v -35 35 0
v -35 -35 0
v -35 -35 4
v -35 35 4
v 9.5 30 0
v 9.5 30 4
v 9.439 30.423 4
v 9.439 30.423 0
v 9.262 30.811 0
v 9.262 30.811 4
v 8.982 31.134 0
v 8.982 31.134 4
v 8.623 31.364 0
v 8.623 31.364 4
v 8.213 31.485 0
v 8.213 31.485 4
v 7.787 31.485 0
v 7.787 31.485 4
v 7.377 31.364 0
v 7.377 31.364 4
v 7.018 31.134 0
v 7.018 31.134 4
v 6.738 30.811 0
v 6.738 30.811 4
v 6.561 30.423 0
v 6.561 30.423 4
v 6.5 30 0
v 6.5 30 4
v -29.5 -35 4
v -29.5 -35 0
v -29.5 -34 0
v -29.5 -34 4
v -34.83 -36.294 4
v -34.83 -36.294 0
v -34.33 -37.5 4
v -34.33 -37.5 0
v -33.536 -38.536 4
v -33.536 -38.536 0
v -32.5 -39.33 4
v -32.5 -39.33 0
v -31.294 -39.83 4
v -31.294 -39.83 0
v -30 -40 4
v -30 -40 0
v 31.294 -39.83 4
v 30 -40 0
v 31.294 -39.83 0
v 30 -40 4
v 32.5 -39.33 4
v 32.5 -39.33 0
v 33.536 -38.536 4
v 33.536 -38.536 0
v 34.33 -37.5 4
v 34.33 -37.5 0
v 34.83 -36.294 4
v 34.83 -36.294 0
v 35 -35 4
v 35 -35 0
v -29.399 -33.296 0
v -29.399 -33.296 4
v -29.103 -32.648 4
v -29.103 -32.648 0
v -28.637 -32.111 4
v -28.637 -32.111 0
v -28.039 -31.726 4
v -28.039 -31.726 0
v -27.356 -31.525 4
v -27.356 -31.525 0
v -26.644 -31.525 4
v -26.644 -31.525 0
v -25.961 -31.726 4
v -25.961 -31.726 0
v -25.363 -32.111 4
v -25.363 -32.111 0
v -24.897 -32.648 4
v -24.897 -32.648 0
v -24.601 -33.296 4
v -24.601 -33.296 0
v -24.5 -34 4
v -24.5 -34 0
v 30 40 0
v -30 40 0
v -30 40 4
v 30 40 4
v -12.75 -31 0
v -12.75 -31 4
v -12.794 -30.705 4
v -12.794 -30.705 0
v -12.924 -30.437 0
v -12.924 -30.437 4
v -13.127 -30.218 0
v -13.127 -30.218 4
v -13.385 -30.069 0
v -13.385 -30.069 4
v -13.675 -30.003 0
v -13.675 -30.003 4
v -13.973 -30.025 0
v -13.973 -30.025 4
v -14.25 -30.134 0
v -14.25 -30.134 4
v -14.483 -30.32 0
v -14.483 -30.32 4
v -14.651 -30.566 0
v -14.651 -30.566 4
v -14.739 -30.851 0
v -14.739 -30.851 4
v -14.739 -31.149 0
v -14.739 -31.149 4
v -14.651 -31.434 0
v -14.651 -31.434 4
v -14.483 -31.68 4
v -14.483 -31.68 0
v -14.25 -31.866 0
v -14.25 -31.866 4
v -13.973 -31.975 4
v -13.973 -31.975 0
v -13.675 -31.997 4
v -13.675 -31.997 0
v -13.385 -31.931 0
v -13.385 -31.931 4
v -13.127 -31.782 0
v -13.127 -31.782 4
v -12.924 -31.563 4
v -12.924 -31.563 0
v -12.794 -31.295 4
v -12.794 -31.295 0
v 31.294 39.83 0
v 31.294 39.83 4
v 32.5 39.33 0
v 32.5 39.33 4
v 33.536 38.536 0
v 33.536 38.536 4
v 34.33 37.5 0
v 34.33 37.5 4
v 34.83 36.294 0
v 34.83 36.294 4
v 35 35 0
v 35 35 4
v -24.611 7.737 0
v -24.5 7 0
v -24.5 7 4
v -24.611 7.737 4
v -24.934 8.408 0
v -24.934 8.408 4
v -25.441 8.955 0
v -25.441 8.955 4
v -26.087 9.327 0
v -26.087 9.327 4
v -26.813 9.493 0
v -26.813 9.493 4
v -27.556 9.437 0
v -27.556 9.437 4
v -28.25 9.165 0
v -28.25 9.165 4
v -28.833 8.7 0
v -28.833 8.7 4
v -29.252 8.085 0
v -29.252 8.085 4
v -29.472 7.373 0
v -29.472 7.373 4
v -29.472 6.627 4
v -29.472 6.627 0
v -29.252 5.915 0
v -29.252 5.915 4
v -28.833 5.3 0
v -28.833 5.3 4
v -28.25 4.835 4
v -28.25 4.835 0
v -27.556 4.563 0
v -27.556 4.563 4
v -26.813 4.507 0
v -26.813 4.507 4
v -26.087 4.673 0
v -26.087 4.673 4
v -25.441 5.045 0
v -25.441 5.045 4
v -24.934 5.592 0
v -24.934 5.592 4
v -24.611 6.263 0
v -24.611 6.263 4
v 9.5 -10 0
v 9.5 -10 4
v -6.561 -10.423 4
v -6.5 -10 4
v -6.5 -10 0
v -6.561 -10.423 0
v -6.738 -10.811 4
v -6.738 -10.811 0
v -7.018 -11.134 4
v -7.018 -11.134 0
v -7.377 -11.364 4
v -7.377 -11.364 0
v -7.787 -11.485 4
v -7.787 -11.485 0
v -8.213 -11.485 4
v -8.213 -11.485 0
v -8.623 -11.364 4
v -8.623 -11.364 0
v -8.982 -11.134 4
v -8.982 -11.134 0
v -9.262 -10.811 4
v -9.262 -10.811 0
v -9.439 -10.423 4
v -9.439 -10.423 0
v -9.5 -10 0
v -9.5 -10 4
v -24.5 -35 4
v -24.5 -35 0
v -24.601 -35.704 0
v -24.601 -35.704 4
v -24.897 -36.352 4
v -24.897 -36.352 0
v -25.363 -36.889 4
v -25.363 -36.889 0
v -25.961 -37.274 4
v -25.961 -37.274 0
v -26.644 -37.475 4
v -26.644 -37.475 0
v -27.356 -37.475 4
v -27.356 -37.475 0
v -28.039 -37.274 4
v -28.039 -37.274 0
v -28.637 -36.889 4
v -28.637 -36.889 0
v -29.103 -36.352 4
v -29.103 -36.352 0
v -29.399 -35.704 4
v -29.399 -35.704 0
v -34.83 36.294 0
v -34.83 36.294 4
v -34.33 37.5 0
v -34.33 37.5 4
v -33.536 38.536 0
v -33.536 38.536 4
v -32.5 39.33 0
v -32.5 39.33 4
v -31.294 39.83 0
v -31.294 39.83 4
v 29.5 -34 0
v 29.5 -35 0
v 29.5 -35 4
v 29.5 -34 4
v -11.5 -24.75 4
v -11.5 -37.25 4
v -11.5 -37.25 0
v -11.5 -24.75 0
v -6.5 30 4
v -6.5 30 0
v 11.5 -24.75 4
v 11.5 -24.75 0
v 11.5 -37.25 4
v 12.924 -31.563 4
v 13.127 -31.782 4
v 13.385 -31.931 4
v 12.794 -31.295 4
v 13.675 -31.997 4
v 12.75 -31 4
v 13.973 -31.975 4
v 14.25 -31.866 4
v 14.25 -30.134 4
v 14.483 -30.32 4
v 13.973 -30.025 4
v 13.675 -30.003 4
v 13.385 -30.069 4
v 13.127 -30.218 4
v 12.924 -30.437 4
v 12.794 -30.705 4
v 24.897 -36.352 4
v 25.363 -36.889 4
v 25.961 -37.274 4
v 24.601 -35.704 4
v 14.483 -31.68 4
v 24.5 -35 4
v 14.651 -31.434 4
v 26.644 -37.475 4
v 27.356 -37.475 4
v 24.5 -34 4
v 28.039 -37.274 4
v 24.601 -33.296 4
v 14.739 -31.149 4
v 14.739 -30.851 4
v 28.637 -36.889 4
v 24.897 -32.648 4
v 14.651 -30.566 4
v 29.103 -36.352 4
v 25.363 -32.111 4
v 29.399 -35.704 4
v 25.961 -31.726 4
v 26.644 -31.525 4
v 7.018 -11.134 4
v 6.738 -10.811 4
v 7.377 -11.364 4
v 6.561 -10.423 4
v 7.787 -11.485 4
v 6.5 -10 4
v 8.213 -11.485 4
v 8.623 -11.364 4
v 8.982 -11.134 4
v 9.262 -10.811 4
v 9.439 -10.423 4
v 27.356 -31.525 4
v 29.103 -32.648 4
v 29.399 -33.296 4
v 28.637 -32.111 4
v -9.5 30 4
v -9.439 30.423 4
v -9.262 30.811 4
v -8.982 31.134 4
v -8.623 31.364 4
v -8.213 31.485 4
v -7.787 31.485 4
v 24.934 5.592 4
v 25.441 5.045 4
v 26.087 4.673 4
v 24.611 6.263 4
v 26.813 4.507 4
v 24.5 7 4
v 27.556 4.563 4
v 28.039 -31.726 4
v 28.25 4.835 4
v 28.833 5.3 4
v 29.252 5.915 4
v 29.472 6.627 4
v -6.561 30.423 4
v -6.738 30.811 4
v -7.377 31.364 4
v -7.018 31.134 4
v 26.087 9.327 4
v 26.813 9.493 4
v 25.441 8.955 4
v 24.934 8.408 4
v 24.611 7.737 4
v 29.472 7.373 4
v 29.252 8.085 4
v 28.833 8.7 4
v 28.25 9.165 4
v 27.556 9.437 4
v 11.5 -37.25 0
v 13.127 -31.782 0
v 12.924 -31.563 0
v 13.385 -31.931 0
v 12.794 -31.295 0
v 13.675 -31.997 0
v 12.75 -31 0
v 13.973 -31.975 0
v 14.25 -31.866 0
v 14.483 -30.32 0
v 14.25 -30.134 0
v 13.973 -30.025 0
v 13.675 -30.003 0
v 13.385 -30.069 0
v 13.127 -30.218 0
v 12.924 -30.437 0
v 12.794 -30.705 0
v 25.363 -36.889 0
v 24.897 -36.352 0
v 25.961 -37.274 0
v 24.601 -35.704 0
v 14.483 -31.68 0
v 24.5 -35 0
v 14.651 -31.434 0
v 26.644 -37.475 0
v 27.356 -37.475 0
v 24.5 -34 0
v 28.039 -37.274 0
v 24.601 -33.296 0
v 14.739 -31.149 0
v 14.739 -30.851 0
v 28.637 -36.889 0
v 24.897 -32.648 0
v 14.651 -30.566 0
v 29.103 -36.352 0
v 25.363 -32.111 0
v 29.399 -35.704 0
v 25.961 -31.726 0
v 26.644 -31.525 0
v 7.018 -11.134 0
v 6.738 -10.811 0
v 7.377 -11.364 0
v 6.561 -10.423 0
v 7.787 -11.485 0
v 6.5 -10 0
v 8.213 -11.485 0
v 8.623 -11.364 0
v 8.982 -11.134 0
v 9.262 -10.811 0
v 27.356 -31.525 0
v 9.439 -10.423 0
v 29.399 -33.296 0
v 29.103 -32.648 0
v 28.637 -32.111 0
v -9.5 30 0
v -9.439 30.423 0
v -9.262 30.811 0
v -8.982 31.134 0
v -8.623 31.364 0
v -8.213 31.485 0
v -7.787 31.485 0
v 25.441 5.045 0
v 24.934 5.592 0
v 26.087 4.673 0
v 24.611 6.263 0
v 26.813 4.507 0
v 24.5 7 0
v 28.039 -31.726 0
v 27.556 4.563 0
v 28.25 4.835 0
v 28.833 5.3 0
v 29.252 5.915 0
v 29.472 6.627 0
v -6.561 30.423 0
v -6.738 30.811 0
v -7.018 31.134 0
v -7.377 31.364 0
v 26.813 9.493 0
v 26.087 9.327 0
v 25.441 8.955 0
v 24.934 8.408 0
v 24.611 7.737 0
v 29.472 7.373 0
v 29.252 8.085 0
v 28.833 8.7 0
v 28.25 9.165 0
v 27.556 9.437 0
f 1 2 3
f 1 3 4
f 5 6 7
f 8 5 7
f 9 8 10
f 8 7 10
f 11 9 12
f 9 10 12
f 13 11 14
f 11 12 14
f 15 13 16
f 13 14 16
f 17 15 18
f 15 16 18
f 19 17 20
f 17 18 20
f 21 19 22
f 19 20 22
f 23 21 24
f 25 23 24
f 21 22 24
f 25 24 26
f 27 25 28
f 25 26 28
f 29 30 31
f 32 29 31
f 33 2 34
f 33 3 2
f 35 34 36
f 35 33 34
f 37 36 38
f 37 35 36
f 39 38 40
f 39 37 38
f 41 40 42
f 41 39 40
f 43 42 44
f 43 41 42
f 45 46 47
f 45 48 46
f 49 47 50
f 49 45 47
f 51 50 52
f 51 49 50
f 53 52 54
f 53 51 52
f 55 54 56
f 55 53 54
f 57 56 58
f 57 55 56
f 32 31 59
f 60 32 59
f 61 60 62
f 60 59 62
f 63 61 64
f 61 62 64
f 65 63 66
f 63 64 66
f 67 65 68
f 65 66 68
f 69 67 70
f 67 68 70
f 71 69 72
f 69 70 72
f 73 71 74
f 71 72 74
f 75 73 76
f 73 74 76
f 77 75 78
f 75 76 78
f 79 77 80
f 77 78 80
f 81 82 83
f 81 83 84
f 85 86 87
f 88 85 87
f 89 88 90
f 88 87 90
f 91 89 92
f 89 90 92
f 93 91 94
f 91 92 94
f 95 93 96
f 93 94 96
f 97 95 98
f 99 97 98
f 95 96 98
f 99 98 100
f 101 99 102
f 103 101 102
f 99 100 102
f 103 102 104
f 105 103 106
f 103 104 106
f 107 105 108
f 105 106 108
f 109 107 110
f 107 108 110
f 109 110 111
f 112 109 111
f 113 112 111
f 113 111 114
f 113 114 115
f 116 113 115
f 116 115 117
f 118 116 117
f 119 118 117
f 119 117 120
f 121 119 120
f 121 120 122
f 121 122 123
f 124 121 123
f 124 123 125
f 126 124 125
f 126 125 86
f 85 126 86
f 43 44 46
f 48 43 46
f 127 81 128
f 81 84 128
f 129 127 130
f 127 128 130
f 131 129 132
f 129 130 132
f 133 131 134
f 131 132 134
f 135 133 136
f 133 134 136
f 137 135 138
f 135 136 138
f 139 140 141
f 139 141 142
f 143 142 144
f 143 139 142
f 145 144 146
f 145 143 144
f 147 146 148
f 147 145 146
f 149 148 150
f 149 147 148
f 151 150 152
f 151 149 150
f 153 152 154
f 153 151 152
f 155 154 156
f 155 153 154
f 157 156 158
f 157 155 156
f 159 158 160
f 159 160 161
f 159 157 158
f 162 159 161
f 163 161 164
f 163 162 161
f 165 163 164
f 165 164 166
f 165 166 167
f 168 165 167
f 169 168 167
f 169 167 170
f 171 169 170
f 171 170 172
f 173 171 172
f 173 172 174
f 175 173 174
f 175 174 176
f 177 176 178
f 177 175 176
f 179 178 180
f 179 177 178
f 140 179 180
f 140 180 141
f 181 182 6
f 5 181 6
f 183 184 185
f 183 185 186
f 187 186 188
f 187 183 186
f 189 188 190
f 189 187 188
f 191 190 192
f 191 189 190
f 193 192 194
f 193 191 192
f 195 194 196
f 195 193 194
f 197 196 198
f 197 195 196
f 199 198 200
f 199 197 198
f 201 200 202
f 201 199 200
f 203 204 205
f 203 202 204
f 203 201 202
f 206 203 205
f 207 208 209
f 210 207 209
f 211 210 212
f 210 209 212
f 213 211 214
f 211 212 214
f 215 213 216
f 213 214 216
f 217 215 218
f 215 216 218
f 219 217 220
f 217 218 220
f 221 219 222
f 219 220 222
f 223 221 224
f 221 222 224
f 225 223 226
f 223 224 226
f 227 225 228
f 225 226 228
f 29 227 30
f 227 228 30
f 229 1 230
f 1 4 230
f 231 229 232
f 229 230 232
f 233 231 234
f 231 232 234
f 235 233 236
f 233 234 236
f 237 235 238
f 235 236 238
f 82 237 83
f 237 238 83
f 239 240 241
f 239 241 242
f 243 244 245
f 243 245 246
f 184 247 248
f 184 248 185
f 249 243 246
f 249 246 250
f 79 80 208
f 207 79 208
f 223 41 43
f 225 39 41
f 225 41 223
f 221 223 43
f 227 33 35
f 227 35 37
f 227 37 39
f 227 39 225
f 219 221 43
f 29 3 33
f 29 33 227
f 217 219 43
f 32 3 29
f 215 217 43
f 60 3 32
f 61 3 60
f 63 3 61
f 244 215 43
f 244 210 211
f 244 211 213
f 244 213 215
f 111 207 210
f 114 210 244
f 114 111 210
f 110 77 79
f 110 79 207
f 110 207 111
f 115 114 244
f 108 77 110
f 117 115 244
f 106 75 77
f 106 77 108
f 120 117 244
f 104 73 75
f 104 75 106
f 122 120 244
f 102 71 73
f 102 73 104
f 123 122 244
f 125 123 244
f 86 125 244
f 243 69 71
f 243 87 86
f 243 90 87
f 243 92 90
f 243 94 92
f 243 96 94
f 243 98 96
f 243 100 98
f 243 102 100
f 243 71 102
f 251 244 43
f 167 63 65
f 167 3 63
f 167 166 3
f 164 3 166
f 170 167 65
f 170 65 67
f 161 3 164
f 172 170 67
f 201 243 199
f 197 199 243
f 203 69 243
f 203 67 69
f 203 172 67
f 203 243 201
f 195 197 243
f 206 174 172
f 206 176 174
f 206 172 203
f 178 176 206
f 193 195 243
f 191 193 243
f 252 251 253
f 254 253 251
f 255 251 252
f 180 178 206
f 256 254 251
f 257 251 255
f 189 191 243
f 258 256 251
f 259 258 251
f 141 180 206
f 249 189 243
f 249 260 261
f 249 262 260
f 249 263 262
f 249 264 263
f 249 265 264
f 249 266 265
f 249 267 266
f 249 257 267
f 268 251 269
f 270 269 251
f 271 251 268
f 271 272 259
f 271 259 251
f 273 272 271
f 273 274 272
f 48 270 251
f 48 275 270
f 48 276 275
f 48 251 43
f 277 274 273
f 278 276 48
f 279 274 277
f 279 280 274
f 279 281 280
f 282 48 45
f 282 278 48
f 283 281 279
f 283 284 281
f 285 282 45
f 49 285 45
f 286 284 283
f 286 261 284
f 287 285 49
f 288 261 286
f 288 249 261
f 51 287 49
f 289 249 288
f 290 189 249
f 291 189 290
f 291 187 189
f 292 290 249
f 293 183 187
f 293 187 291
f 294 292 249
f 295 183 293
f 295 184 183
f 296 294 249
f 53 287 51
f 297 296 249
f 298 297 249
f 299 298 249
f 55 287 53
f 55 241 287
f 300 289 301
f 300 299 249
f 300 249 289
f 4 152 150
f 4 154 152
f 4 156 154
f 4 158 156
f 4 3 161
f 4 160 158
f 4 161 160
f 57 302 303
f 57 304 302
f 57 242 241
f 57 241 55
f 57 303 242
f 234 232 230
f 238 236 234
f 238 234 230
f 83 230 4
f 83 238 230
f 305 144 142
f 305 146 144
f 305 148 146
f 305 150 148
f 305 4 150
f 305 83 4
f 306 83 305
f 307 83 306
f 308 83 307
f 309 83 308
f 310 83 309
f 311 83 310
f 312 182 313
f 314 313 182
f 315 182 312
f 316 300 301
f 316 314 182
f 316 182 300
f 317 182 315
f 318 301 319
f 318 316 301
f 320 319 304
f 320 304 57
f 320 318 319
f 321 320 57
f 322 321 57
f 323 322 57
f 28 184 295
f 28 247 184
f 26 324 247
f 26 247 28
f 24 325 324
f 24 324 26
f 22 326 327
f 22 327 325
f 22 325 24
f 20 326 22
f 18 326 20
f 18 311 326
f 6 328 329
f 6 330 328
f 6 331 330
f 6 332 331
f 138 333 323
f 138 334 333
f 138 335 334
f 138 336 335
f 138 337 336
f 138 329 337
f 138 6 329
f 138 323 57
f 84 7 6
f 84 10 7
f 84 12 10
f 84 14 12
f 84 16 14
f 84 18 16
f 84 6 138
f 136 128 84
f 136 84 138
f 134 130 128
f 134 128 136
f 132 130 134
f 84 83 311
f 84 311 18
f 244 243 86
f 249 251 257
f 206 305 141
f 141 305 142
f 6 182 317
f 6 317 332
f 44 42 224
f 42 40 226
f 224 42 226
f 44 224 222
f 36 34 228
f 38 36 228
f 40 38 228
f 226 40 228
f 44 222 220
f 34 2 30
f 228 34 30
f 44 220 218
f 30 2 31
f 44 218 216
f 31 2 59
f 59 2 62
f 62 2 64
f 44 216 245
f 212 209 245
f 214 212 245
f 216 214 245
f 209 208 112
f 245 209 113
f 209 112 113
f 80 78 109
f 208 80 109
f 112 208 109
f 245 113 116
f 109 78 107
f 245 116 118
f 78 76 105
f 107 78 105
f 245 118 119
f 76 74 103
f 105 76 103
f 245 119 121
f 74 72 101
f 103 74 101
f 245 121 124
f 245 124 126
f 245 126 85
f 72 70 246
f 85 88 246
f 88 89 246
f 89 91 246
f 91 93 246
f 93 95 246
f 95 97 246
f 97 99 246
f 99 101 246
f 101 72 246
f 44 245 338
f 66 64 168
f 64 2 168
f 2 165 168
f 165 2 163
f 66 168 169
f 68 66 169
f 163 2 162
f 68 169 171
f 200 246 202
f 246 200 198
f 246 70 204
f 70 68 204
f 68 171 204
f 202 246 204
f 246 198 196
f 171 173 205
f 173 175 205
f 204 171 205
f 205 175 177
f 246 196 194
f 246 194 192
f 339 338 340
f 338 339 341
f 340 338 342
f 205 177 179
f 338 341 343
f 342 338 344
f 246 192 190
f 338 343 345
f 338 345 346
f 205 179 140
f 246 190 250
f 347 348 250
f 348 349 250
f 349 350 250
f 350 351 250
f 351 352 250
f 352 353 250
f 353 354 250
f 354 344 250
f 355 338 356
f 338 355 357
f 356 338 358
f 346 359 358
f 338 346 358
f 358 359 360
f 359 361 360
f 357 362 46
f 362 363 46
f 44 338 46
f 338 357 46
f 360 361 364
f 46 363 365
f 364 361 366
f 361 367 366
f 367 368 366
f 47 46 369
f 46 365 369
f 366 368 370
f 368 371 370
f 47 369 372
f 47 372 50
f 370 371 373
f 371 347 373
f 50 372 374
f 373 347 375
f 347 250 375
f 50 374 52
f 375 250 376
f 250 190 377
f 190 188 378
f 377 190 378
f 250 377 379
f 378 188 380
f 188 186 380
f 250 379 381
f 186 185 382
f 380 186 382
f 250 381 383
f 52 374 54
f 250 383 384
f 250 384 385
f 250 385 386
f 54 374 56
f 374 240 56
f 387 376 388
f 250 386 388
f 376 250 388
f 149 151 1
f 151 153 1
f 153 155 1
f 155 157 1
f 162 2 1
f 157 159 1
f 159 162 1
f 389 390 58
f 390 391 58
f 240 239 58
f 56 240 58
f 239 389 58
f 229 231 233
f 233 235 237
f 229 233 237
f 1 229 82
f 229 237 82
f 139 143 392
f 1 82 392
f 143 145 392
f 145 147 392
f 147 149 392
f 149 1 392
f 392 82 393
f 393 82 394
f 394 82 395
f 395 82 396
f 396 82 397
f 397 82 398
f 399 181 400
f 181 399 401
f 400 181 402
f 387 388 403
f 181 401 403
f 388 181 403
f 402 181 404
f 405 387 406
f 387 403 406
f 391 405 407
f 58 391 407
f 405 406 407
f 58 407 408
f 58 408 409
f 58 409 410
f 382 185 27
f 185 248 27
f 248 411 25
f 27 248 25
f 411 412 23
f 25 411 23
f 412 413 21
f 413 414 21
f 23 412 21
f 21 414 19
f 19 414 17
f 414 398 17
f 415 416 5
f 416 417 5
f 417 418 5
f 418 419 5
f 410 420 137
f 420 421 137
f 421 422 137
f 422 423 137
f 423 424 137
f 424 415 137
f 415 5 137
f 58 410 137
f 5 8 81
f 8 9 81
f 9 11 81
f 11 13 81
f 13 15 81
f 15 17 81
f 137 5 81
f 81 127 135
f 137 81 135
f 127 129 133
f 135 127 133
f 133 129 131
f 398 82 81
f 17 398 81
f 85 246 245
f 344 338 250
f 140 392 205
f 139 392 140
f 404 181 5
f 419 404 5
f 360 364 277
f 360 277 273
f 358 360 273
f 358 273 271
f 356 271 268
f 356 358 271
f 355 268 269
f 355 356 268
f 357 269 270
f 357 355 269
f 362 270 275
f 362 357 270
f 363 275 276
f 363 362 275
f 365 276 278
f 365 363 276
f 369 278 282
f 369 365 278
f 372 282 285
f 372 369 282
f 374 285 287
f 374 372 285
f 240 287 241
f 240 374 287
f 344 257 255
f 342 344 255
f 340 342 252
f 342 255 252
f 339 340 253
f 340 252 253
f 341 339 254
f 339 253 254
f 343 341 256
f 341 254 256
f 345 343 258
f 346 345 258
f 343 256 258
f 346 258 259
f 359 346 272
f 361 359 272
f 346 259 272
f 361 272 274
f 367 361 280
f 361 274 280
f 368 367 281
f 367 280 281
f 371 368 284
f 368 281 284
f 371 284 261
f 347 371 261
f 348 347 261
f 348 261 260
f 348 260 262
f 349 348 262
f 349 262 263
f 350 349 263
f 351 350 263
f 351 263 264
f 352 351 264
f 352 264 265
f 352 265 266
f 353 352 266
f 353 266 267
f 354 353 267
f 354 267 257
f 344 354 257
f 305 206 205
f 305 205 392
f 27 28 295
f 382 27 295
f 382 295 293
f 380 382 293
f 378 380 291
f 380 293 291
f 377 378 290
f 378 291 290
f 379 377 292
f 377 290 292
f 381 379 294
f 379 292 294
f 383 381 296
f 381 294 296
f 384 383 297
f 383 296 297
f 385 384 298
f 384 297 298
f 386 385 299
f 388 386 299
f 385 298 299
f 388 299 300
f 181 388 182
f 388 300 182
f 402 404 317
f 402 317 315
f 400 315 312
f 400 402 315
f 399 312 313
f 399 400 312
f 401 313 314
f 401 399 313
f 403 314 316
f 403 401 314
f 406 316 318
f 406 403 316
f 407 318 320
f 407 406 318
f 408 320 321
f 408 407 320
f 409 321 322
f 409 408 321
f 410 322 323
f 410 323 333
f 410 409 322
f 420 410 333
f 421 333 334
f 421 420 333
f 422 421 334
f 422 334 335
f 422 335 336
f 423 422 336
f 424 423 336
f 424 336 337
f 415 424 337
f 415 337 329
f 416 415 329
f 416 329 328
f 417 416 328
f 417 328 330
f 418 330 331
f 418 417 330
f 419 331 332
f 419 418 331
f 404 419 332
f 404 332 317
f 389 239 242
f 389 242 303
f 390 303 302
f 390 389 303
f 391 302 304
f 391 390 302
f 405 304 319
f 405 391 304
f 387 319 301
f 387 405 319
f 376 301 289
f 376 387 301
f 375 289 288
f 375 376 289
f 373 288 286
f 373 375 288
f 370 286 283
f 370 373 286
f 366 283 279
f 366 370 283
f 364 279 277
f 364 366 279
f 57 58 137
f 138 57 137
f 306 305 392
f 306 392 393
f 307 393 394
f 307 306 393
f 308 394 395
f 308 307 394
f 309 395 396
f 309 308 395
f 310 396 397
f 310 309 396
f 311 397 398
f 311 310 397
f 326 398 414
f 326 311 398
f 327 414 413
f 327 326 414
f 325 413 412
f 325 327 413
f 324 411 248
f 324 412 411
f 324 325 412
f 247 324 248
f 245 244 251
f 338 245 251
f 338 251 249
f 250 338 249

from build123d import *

# Parameters (mm, degrees)
SKETCH4_W           = 70
SKETCH4_H           = 80
SKETCH4_R           = 2.5
BOSS_EXTRUDE2_DEPTH = 4
FILLET1_R           = 5
SKETCH6_R           = 1
SKETCH6_W           = 23
SKETCH6_H           = 12.5
CUT_EXTRUDE1_DEPTH  = 54.301031885


with BuildPart() as part:
    # Sketch4 → Boss-Extrude2 (new body)
    with BuildSketch(Plane.XY):
        Rectangle(SKETCH4_W, SKETCH4_H)
        with Locations((-27, 7)):
            Circle(SKETCH4_R, mode=Mode.SUBTRACT)
        with Locations(Location((27, 7, 0), (0, 0, 180))):
            Circle(SKETCH4_R, mode=Mode.SUBTRACT)
        with BuildLine():
            Line((-24.5, -34), (-24.5, -35))
            ThreePointArc((-24.5, -35), (-27, -37.5), (-29.5, -35))
            Line((-29.5, -35), (-29.5, -34))
            ThreePointArc((-29.5, -34), (-27, -31.5), (-24.5, -34))
        make_face(mode=Mode.SUBTRACT)
        with BuildLine():
            Line((24.5, -34), (24.5, -35))
            ThreePointArc((24.5, -35), (27, -37.5), (29.5, -35))
            Line((29.5, -35), (29.5, -34))
            ThreePointArc((29.5, -34), (27, -31.5), (24.5, -34))
        make_face(mode=Mode.SUBTRACT)
    extrude(amount=BOSS_EXTRUDE2_DEPTH)

    # Fillet1
    fillet1_edges = [part.edges().sort_by_distance(p)[0] for p in [
        (35, -40, 2),
        (-35, -40, 2),
        (-35, 40, 2),
        (35, 40, 2),
    ]]
    fillet(fillet1_edges, radius=FILLET1_R)

    # Sketch6 → Cut-Extrude1 (cut, through all)
    with BuildSketch(Plane.XY.offset(4)):
        with Locations((-13.75, -31)):
            Circle(SKETCH6_R)
        with Locations(Location((13.75, -31, 0), (0, 0, 180))):
            Circle(SKETCH6_R)
        with Locations((0, -31)):
            Rectangle(SKETCH6_W, SKETCH6_H)
        with BuildLine():
            Line((-6.5, 30), (-6.5, -10))
            ThreePointArc((-6.5, -10), (-8, -11.5), (-9.5, -10))
            Line((-9.5, -10), (-9.5, 30))
            ThreePointArc((-9.5, 30), (-8, 31.5), (-6.5, 30))
        make_face()
        with BuildLine():
            Line((6.5, 30), (6.5, -10))
            ThreePointArc((6.5, -10), (8, -11.5), (9.5, -10))
            Line((9.5, -10), (9.5, 30))
            ThreePointArc((9.5, 30), (8, 31.5), (6.5, 30))
        make_face()
    extrude(amount=-CUT_EXTRUDE1_DEPTH, mode=Mode.SUBTRACT)


solid = part.part
